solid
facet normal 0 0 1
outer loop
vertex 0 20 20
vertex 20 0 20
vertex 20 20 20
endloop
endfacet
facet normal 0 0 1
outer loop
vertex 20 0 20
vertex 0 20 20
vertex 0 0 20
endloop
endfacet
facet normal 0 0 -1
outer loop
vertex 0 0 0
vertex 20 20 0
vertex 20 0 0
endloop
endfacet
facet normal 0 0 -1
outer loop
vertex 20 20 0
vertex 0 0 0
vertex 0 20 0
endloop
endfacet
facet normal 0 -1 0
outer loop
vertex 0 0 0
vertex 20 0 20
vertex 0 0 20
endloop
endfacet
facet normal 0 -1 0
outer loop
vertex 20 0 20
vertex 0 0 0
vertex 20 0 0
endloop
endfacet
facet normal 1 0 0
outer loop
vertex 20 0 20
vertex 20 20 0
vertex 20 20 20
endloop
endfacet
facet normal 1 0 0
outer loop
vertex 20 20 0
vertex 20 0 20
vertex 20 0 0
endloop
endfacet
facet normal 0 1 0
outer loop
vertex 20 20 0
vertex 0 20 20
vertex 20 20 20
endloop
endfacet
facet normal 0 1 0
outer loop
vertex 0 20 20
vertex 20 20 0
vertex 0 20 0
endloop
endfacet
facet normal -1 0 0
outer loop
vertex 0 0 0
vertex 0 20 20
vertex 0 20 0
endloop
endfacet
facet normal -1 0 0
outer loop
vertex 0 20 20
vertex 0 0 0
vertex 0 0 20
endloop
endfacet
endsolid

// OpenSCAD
// Fixture: a plain 20mm cube. No includes/libraries required.
// Customizer parameter (for param-export round-trip tests).
size = 20; // [5:50]

cube([size, size, size]);
